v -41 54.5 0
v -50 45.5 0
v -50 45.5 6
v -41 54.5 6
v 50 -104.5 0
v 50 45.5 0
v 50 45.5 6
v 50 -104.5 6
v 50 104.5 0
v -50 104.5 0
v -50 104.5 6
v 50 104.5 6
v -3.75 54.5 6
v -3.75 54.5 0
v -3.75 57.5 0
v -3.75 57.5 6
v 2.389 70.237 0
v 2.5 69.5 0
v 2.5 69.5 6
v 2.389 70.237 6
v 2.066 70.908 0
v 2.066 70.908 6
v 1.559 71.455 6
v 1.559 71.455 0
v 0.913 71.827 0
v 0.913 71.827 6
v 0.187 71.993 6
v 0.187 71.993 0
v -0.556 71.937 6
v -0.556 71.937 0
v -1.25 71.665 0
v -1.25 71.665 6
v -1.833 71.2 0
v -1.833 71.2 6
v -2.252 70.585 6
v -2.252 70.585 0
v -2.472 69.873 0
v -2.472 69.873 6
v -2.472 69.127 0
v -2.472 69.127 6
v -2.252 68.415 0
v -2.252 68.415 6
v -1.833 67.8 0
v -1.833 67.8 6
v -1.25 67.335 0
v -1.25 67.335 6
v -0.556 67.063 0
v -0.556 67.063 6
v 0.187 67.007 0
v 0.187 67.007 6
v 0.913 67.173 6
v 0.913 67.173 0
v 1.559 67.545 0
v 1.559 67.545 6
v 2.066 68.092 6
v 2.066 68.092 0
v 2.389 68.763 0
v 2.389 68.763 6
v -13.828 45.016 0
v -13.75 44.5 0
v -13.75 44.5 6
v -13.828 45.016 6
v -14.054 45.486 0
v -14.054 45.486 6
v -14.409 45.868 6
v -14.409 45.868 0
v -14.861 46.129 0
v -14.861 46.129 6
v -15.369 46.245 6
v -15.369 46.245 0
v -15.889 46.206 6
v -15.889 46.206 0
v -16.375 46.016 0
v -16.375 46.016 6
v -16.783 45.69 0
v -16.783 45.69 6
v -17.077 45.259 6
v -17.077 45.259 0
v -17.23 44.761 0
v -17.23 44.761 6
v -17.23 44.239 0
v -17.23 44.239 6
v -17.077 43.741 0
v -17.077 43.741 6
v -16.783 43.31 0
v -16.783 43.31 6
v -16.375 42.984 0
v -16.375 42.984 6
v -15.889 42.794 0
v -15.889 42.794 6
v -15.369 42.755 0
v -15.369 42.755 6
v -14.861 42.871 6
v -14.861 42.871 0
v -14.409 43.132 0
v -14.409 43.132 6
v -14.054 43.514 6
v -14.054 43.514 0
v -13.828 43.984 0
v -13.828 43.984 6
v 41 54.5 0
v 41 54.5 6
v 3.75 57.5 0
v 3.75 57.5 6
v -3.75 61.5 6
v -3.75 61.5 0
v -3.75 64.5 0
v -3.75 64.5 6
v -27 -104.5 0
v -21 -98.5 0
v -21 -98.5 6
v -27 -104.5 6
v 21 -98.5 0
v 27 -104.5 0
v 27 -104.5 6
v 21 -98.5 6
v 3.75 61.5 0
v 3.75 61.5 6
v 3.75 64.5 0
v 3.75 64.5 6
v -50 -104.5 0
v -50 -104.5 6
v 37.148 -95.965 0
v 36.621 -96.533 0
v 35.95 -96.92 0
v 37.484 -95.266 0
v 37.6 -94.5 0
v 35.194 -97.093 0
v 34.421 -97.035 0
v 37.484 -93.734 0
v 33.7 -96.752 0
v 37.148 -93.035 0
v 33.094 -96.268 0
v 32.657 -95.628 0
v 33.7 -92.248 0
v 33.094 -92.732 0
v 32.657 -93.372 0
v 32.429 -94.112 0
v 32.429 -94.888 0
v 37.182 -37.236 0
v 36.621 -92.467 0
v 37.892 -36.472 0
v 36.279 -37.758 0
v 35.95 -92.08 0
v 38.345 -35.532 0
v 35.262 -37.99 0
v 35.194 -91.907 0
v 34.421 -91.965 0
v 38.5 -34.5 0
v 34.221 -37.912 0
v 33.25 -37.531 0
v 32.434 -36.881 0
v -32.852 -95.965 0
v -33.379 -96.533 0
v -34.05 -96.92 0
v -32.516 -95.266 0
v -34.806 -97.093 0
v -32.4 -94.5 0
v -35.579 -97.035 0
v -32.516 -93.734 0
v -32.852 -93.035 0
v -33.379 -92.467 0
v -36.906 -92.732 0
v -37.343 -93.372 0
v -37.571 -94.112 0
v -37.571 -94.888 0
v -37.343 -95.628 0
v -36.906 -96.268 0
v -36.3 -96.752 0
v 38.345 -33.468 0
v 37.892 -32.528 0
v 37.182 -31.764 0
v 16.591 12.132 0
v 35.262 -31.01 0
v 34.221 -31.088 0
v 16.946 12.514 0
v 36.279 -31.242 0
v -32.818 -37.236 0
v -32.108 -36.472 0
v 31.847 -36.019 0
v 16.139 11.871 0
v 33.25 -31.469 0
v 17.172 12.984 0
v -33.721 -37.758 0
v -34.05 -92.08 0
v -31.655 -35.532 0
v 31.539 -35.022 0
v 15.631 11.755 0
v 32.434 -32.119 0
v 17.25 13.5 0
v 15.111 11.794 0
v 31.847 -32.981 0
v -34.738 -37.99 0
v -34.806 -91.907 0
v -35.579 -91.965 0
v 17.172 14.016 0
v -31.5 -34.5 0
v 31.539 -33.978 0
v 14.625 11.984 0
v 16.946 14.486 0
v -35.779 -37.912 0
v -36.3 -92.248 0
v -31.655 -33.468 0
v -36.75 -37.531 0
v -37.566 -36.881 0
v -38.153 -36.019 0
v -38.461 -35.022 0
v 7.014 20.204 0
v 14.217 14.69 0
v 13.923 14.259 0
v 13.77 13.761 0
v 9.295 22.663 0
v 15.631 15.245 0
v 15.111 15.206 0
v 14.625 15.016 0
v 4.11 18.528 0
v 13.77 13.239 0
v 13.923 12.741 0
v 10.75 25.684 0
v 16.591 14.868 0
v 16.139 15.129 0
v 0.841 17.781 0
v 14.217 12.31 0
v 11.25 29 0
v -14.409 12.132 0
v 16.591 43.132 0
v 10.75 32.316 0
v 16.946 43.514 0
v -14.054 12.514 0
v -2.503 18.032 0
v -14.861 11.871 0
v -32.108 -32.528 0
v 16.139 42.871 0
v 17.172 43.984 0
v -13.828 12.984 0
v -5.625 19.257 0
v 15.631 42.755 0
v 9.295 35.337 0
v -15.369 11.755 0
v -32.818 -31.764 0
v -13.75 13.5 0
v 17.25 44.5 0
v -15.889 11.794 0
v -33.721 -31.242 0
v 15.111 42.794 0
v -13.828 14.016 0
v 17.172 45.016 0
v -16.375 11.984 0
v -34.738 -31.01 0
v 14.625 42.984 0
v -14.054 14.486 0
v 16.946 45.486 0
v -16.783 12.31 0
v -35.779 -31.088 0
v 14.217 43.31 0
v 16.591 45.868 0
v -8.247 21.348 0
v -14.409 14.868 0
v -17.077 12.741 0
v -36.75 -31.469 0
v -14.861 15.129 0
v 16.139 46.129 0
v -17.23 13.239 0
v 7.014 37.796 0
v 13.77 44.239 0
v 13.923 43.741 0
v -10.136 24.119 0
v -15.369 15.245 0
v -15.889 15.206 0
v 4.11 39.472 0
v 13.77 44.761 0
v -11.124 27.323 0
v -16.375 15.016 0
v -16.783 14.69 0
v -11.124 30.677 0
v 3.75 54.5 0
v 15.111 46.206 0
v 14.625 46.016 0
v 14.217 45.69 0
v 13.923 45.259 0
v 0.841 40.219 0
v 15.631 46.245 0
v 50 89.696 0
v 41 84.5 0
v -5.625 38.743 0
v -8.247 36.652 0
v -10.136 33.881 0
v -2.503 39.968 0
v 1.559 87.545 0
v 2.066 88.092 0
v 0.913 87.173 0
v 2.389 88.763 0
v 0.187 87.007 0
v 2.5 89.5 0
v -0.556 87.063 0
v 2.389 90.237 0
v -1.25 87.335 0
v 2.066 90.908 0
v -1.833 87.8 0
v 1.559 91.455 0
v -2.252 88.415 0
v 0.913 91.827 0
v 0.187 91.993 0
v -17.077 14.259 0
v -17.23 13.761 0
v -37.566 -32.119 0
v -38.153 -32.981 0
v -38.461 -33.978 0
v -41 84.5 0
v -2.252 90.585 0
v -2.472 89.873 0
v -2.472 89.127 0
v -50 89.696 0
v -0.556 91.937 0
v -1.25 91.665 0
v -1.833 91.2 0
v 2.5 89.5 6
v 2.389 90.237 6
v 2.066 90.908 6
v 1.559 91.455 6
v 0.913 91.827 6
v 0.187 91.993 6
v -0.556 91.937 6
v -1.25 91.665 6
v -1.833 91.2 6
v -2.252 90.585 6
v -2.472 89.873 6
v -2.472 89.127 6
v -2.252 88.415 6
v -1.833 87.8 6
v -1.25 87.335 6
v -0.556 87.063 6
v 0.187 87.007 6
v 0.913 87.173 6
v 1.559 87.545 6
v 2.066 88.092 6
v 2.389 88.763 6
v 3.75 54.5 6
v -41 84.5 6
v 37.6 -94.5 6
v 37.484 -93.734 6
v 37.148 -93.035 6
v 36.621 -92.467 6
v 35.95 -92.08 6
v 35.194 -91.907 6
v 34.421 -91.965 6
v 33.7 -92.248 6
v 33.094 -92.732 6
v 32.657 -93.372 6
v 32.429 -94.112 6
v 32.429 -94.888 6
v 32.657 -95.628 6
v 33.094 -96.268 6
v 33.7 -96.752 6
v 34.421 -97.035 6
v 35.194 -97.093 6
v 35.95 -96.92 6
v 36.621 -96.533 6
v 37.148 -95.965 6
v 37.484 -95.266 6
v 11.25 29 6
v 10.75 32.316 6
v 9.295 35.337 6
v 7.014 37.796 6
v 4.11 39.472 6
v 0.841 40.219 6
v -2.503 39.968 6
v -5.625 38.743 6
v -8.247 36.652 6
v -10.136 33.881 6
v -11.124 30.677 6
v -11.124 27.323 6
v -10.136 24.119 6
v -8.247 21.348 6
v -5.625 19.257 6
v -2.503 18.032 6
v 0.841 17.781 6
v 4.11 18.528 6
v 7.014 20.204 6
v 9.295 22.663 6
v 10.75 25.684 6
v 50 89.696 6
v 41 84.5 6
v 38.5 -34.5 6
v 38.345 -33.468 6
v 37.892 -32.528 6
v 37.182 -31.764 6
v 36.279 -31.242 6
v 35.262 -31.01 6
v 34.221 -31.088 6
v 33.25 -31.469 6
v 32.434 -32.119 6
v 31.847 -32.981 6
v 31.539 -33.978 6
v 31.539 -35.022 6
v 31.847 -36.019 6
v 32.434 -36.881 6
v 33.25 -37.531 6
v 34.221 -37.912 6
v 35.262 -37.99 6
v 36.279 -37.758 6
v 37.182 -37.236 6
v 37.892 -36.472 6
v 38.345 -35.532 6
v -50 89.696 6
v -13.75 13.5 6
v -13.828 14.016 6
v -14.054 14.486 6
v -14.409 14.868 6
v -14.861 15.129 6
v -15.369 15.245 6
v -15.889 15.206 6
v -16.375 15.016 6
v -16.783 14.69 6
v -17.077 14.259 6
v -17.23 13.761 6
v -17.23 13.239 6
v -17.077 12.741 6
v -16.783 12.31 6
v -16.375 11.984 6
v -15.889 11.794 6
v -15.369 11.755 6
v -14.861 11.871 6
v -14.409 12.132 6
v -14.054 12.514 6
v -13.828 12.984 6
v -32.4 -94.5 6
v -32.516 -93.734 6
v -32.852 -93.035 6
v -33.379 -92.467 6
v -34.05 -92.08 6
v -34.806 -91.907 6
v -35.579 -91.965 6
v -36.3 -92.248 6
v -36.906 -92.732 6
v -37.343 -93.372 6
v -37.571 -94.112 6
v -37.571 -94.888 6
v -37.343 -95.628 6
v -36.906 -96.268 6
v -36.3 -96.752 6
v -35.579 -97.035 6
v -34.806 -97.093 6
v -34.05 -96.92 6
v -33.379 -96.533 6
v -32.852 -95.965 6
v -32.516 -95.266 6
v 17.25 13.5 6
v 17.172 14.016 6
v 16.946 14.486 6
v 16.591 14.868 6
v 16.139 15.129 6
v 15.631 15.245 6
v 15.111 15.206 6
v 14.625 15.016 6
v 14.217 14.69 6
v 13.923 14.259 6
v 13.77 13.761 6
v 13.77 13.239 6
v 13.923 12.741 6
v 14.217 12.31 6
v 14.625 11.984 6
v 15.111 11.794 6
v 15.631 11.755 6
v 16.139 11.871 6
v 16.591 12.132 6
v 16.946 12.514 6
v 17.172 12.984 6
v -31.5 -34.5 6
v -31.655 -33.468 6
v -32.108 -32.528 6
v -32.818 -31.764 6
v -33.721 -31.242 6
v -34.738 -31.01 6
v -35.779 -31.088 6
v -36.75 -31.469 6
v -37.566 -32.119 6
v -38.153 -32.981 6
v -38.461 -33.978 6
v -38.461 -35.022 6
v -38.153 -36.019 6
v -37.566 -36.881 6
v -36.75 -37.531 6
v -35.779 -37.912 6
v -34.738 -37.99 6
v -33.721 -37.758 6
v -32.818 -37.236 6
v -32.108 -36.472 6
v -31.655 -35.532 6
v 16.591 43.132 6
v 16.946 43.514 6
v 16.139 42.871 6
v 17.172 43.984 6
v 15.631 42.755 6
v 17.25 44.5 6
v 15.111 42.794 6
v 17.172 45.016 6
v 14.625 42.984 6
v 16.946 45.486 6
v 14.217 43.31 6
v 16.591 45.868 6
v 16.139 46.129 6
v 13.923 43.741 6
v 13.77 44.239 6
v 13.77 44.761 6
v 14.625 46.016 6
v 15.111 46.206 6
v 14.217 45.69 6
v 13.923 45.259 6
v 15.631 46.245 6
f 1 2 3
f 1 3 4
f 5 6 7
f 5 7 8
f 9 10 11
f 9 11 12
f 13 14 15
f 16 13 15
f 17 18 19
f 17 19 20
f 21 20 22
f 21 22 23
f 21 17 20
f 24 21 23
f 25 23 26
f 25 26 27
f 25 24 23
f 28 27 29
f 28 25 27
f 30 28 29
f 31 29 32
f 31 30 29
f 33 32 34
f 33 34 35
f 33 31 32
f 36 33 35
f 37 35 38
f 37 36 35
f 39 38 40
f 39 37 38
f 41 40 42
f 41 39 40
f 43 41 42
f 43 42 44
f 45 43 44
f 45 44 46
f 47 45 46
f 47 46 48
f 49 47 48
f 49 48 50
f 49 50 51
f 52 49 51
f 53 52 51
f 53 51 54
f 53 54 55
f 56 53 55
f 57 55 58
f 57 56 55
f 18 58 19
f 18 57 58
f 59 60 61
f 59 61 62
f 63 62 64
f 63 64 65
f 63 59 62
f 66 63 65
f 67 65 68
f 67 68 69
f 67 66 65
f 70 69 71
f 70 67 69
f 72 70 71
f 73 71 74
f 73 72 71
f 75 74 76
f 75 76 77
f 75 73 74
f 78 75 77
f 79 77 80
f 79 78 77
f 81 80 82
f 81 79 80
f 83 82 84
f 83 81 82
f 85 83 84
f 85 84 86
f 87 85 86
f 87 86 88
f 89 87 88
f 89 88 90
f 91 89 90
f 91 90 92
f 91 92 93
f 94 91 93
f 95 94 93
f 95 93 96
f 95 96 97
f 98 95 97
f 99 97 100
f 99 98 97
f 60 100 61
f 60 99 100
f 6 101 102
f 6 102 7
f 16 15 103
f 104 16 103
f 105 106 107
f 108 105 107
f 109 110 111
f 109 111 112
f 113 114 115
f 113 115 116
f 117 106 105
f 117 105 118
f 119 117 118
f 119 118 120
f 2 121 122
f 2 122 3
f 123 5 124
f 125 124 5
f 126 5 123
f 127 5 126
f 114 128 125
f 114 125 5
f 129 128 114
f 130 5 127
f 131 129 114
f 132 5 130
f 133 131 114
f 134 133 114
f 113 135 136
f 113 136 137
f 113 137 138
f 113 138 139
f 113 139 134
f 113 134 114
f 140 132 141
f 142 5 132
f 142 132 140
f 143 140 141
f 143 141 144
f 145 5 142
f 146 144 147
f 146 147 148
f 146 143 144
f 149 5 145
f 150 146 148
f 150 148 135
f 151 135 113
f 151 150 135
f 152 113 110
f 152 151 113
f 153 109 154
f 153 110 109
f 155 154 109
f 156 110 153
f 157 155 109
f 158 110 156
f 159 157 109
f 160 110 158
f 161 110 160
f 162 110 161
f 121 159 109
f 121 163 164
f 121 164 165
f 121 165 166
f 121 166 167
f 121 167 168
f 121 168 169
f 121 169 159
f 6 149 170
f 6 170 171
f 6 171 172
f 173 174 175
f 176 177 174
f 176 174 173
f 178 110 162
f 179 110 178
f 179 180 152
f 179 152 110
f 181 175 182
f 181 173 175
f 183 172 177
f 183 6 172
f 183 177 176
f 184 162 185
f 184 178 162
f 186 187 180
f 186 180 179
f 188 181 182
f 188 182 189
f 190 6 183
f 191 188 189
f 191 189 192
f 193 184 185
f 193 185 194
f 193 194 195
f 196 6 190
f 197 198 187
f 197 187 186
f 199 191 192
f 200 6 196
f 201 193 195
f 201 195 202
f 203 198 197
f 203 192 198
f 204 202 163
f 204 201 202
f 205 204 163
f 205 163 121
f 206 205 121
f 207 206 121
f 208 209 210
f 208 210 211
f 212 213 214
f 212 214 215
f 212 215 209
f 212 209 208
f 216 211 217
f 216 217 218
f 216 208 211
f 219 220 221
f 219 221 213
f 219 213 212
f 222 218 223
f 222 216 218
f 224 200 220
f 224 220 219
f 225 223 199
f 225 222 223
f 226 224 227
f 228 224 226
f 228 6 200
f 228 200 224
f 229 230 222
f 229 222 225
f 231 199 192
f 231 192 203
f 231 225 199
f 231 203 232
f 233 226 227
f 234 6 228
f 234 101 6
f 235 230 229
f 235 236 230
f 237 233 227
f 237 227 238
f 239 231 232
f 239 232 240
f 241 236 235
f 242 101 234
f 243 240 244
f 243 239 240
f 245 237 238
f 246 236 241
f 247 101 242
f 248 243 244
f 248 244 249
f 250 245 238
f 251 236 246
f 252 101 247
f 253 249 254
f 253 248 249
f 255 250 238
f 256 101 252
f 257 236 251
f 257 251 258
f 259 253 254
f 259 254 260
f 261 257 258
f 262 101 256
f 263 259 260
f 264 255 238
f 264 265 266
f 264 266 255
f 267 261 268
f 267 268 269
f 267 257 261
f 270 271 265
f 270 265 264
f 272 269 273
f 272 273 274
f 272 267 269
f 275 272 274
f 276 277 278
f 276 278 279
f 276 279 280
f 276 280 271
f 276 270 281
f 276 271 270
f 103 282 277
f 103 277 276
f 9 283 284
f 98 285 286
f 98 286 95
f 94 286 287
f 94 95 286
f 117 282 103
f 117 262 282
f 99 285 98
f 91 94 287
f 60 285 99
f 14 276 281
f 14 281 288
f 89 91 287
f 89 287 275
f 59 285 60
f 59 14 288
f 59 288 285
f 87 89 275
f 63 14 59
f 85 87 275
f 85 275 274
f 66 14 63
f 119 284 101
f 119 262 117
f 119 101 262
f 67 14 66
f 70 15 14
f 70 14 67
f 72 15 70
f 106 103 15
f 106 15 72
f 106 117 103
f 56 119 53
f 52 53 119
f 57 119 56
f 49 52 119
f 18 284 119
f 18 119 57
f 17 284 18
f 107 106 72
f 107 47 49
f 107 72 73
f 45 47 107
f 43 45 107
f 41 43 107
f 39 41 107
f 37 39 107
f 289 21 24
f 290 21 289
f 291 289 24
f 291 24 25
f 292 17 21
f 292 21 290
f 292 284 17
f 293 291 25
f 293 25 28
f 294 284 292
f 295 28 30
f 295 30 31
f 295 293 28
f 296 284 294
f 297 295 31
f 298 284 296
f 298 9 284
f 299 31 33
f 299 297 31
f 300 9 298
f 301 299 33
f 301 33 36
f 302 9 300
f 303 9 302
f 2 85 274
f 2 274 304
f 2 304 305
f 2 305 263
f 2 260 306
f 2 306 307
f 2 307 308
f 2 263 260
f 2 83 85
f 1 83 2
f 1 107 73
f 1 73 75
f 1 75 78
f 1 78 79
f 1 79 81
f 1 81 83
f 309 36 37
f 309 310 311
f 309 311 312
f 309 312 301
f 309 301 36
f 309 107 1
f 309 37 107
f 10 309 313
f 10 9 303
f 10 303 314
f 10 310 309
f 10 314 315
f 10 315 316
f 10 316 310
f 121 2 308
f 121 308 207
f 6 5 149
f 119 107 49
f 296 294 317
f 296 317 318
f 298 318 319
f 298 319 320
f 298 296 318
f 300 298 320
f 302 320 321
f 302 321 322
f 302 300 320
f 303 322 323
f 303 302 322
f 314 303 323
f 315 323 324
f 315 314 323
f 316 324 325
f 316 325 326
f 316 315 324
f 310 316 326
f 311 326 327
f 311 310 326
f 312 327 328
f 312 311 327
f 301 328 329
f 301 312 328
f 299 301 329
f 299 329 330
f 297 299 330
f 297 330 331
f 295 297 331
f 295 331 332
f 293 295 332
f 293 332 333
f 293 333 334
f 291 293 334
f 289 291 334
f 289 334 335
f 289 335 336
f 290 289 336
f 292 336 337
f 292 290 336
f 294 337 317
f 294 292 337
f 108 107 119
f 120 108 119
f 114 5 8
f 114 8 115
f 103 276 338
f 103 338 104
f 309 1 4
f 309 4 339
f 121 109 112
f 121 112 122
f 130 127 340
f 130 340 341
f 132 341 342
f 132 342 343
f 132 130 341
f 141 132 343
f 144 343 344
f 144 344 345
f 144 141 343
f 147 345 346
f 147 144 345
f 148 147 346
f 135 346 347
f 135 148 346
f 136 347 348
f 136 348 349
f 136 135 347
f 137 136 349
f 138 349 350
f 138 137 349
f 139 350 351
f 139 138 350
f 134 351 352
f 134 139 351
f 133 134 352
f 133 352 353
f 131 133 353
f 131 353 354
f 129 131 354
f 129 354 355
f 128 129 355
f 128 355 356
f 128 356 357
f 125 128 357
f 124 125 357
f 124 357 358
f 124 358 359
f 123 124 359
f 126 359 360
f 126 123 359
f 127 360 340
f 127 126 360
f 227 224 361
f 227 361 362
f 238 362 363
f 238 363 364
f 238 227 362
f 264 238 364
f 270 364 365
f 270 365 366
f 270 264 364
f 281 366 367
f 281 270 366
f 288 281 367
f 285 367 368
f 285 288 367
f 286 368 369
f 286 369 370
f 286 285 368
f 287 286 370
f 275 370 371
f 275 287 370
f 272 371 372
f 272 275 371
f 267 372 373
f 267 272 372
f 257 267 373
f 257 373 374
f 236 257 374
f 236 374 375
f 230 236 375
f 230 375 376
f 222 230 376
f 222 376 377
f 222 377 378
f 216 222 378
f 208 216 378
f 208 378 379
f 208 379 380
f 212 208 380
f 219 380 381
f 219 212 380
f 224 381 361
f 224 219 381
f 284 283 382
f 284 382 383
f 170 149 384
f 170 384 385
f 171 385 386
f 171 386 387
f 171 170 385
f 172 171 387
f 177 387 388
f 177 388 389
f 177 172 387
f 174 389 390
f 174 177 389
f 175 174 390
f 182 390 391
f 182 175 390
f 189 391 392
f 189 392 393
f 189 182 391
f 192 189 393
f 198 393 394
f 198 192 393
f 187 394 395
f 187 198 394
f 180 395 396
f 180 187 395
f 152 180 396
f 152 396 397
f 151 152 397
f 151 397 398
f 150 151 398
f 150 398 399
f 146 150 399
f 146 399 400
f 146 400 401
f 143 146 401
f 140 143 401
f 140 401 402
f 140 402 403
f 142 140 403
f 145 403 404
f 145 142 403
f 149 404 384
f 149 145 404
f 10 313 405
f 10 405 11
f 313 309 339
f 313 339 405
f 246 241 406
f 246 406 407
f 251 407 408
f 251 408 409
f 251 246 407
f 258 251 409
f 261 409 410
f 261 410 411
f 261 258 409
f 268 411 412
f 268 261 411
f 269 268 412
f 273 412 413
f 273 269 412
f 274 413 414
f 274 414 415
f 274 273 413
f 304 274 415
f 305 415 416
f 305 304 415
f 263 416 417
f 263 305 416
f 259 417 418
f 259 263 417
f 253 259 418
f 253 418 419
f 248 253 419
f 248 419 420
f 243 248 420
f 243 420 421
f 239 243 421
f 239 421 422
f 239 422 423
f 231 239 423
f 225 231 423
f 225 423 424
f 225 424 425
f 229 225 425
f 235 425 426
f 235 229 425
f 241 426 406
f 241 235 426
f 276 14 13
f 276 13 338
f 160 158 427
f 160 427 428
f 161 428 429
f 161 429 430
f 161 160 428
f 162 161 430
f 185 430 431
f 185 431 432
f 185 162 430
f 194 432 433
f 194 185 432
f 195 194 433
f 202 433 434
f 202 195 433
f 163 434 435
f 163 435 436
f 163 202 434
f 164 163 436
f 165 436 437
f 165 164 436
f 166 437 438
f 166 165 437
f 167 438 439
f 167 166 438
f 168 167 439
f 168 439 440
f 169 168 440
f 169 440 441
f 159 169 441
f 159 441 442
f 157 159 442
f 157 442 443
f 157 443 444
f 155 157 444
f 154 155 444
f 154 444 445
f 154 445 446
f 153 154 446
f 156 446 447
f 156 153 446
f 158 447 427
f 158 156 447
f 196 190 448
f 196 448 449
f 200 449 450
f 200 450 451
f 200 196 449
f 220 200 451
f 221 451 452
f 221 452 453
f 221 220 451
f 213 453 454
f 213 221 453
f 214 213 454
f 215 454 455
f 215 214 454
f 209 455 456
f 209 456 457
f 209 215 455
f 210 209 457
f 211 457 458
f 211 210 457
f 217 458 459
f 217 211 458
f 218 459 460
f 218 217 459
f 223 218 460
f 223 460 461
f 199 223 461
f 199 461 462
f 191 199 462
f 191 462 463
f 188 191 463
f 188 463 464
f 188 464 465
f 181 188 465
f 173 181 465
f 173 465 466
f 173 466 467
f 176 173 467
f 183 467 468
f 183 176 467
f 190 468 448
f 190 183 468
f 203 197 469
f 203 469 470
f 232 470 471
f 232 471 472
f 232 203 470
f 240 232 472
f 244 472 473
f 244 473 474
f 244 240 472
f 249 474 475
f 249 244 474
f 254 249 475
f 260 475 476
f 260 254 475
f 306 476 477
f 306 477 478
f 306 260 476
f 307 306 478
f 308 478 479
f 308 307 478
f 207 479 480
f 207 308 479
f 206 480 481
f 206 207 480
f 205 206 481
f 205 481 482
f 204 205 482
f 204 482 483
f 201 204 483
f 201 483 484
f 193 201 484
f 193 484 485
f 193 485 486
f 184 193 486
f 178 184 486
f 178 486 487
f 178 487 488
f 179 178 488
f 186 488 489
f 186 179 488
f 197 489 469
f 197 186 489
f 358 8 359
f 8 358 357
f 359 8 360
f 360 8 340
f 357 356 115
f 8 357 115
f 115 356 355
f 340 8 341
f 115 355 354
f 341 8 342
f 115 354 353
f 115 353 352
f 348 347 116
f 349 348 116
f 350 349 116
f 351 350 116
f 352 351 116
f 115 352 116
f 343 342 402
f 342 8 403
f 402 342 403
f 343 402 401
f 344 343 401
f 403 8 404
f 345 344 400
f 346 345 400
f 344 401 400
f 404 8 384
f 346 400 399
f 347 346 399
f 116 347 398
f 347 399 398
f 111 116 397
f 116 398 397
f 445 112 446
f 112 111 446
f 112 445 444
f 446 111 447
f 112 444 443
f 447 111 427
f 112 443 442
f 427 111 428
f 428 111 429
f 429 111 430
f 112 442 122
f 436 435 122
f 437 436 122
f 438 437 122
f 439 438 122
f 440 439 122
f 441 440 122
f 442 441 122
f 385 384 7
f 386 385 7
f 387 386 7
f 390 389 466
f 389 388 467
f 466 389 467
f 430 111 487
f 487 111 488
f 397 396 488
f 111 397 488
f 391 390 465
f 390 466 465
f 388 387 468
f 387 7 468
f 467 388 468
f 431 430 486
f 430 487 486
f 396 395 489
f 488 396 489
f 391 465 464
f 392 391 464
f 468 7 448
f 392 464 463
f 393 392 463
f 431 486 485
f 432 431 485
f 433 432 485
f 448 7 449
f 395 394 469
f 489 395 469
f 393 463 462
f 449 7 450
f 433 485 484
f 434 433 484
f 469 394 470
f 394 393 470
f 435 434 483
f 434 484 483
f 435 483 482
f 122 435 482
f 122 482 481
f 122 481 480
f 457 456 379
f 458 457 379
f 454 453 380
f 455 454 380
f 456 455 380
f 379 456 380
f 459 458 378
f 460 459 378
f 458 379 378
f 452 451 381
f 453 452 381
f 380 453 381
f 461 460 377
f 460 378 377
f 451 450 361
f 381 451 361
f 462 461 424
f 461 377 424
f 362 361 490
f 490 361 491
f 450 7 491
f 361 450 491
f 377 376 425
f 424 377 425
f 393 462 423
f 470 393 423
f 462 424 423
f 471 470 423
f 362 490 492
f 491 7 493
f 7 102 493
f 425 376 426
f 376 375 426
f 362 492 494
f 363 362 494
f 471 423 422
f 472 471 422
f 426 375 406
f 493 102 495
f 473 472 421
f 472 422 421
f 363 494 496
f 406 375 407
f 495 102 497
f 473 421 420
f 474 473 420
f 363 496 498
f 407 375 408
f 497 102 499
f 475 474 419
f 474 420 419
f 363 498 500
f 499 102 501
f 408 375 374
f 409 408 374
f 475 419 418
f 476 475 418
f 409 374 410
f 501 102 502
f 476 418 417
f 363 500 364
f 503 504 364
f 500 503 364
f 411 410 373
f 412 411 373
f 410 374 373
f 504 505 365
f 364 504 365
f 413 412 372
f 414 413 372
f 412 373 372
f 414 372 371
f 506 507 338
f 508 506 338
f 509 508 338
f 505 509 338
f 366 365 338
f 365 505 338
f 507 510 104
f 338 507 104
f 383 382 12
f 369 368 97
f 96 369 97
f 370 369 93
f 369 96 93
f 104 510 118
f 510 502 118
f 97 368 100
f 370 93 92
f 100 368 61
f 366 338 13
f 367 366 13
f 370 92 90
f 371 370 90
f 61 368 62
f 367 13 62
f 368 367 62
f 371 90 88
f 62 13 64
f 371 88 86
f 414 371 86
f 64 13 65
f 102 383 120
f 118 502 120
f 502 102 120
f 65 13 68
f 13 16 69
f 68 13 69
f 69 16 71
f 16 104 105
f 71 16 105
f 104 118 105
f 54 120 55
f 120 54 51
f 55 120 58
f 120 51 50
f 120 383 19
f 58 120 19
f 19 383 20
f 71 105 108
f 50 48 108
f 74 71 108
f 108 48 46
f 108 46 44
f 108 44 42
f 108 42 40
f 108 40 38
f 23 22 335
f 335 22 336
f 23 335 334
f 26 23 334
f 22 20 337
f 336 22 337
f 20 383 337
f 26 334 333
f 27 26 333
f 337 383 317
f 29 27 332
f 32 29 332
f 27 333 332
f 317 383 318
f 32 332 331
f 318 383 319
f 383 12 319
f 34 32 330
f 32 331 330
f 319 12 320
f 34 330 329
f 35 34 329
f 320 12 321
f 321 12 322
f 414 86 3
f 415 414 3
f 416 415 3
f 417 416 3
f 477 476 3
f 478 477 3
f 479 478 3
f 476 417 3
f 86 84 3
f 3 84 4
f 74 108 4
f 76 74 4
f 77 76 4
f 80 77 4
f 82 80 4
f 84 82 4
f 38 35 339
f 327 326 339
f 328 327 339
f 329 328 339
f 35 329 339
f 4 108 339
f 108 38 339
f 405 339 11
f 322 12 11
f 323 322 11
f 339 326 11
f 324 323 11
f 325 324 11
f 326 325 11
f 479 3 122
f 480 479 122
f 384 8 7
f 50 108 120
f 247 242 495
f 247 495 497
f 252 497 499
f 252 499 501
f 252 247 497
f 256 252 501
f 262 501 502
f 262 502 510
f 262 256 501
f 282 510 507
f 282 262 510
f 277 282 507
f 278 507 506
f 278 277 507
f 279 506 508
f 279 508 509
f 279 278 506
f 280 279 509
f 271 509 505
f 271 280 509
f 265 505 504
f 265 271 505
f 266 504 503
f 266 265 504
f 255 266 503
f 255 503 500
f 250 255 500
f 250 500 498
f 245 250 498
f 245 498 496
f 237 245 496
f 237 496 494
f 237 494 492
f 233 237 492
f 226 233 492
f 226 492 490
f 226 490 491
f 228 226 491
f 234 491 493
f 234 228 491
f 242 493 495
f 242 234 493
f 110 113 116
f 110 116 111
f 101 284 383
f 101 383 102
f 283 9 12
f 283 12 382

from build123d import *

# Parameters (mm, degrees)
CROQUIS1_R              = 2.6
CROQUIS1_R_2            = 3.5
CROQUIS1_R_3            = 1.75
CROQUIS1_R_4            = 11.25
CROQUIS1_R_5            = 2.5
CROQUIS1_W              = 7.5
CROQUIS1_H              = 3
SALIENTE_EXTRUIR1_DEPTH = 6


with BuildPart() as part:
    # Croquis1 → Saliente-Extruir1 (new body)
    with BuildSketch(Plane.XY):
        Polygon((-50, -104.5), (-50, 45.5), (-41, 54.5), (-41, 84.5), (-50, 89.696152423), (-50, 104.5), (50, 104.5), (50, 89.696152423), (41, 84.5), (41, 54.5), (50, 45.5), (50, -104.5), (27, -104.5), (21, -98.5), (-21, -98.5), (-27, -104.5), align=None)
        with Locations((-35, -94.5)):
            Circle(CROQUIS1_R, mode=Mode.SUBTRACT)
        with Locations((-35, -34.5)):
            Circle(CROQUIS1_R_2, mode=Mode.SUBTRACT)
        with Locations((35, -34.5)):
            Circle(CROQUIS1_R_2, mode=Mode.SUBTRACT)
        with Locations((35, -94.5)):
            Circle(CROQUIS1_R, mode=Mode.SUBTRACT)
        with Locations((-15.5, 13.5)):
            Circle(CROQUIS1_R_3, mode=Mode.SUBTRACT)
        with Locations((15.5, 13.5)):
            Circle(CROQUIS1_R_3, mode=Mode.SUBTRACT)
        with Locations((0, 29)):
            Circle(CROQUIS1_R_4, mode=Mode.SUBTRACT)
        with Locations((15.5, 44.5)):
            Circle(CROQUIS1_R_3, mode=Mode.SUBTRACT)
        with Locations((-15.5, 44.5)):
            Circle(CROQUIS1_R_3, mode=Mode.SUBTRACT)
        with Locations((0, 69.5)):
            Circle(CROQUIS1_R_5, mode=Mode.SUBTRACT)
        with Locations((0, 89.5)):
            Circle(CROQUIS1_R_5, mode=Mode.SUBTRACT)
        with Locations((0, 56)):
            Rectangle(CROQUIS1_W, CROQUIS1_H, mode=Mode.SUBTRACT)
        with Locations((0, 63)):
            Rectangle(CROQUIS1_W, CROQUIS1_H, mode=Mode.SUBTRACT)
    extrude(amount=SALIENTE_EXTRUIR1_DEPTH)


solid = part.part
